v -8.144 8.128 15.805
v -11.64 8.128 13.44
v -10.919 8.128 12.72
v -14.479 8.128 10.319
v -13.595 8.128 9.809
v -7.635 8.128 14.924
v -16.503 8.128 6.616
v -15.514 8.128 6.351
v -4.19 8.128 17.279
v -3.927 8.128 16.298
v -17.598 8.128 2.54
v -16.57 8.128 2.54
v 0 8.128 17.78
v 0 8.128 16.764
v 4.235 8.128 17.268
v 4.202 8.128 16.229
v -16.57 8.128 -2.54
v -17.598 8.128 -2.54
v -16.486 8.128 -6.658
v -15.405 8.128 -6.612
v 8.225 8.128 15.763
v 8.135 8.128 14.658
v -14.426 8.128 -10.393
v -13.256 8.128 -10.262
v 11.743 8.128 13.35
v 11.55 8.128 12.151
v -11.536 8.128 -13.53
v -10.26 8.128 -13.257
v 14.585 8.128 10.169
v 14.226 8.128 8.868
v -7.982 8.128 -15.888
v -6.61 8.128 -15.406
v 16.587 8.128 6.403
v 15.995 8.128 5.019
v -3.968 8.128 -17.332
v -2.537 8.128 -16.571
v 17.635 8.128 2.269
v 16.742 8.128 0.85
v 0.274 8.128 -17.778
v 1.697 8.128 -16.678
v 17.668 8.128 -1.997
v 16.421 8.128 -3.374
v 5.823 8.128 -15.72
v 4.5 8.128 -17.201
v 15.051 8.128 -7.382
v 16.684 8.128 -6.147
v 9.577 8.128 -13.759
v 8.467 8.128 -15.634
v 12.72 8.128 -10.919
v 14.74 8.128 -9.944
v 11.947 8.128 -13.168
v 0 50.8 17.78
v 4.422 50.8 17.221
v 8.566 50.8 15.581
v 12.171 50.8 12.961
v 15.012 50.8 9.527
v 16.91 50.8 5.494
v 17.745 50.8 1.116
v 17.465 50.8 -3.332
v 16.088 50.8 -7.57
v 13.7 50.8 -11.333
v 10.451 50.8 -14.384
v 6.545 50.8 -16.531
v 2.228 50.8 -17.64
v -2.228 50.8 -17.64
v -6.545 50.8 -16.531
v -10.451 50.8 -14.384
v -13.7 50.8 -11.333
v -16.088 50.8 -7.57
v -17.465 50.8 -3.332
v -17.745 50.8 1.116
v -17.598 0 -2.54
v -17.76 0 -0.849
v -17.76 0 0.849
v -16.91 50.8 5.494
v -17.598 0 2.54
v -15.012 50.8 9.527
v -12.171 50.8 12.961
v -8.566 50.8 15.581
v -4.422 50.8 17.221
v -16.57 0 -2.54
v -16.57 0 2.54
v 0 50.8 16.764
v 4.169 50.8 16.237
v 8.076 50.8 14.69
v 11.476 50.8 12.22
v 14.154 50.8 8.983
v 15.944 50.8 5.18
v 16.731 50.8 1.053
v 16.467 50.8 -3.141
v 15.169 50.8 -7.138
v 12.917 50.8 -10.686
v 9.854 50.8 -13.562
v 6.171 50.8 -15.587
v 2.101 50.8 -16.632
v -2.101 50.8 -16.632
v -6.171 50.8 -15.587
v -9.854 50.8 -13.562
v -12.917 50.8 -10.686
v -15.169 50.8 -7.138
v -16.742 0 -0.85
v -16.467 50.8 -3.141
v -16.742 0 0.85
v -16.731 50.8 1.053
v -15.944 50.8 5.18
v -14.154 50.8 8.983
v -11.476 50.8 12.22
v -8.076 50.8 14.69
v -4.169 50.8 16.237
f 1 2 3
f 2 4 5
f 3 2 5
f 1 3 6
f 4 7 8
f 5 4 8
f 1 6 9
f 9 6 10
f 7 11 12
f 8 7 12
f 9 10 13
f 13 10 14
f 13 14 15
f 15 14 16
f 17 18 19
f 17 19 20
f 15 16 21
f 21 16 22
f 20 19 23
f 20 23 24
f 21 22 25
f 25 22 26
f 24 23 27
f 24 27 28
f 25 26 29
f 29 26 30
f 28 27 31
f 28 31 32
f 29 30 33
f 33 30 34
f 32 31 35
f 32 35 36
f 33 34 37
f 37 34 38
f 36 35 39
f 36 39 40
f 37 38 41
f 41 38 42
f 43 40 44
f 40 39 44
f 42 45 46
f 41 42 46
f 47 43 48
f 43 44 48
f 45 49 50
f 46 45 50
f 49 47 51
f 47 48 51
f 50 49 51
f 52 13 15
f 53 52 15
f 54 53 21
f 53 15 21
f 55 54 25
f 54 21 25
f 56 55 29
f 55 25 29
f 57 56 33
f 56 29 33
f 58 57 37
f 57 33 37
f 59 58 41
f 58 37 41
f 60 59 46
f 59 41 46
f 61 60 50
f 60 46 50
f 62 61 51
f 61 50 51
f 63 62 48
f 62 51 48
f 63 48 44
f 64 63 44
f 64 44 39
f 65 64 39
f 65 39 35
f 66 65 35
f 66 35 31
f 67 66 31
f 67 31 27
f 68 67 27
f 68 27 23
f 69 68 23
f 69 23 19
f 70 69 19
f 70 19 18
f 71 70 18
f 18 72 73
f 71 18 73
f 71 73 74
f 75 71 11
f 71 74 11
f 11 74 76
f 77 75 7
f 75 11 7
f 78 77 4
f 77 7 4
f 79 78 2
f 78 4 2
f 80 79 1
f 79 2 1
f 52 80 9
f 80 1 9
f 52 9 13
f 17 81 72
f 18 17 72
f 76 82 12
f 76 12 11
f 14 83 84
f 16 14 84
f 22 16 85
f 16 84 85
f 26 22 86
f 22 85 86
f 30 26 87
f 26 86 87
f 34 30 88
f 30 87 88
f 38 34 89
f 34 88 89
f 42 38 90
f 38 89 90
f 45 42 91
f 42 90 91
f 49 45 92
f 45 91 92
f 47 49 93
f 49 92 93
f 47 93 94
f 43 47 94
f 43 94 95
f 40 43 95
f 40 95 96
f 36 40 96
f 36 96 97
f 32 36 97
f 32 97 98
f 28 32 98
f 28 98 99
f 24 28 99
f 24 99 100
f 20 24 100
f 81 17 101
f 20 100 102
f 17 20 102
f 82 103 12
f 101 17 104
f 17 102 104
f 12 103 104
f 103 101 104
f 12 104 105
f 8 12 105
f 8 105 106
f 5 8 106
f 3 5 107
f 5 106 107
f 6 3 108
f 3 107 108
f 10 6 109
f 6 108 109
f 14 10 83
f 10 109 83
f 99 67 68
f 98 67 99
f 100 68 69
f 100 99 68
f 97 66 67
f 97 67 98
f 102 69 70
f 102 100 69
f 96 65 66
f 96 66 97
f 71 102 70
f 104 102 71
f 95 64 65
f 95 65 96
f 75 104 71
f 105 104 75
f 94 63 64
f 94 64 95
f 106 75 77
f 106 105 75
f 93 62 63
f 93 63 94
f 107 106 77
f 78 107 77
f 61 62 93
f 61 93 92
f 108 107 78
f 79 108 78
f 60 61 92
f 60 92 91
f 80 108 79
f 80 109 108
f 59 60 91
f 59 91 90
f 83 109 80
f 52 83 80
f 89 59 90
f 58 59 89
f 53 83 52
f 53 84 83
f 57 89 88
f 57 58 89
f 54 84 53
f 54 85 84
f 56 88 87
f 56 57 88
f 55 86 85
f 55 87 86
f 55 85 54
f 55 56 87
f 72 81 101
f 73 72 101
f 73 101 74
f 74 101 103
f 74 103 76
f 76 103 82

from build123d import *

# Parameters (mm, degrees)
SKETCH1_R               = 17.78
BOSS_EXTRUDE1_DEPTH     = 50.8
SKETCH2_R               = 16.764
CUT_EXTRUDE1_DEPTH      = 177.8
CUT_EXTRUDE3_DEPTH      = 8.128
CUT_EXTRUDE5_DEPTH      = 8.128
CUT_EXTRUDE6_DEPTH      = 57.682420555
CUT_EXTRUDE6_DEPTH_BACK = 57.682420555
SKETCH8_W               = 2.16473232
SKETCH8_H               = 8.128


with BuildPart() as part:
    # Sketch1 → Boss-Extrude1 (new body)
    with BuildSketch(Plane(origin=(0, 0, 0), x_dir=(1, 0, 0), z_dir=(0, 1, 0))):
        with Locations(Location((0, 0, 0), (0, 0, 270))):
            Circle(SKETCH1_R)
    extrude(amount=BOSS_EXTRUDE1_DEPTH)

    # Sketch2 → Cut-Extrude1 (cut)
    with BuildSketch(Plane(origin=(0, 50.8, 0), x_dir=(1, 0, 0), z_dir=(0, 1, 0))):
        with Locations(Location((0, 0, 0), (0, 0, 270))):
            Circle(SKETCH2_R)
    extrude(amount=-CUT_EXTRUDE1_DEPTH, mode=Mode.SUBTRACT)

    # Sketch5 → Cut-Extrude3 (cut)
    with BuildSketch(Plane(origin=(0, 0, 0), x_dir=(1, 0, 0), z_dir=(0, 1, 0))):
        with BuildLine():
            Line((17.78, 2.54), (-17.78, 2.54))
            ThreePointArc((-17.78, 2.54), (0, 20.32), (17.78, 2.54))
        make_face()
    extrude(amount=CUT_EXTRUDE3_DEPTH, mode=Mode.SUBTRACT)

    # Sketch6 → Cut-Extrude5 (cut)
    with BuildSketch(Plane(origin=(0, 0, 0), x_dir=(1, 0, 0), z_dir=(0, 1, 0))):
        with BuildLine():
            Line((17.78, -2.54), (-17.78, -2.54))
            ThreePointArc((-17.78, -2.54), (0, -18.882130931), (17.78, -2.54))
        make_face()
    extrude(amount=CUT_EXTRUDE5_DEPTH, mode=Mode.SUBTRACT)

    # Sketch8 → Cut-Extrude6 (cut, two sides: drawn at the far end of the back side and taken through both)
    with BuildSketch(Plane.XY.offset(-CUT_EXTRUDE6_DEPTH_BACK)):
        with Locations((17.267156574, 4.064)):
            Rectangle(SKETCH8_W, SKETCH8_H)
    extrude(amount=CUT_EXTRUDE6_DEPTH + CUT_EXTRUDE6_DEPTH_BACK, mode=Mode.SUBTRACT)


solid = part.part
